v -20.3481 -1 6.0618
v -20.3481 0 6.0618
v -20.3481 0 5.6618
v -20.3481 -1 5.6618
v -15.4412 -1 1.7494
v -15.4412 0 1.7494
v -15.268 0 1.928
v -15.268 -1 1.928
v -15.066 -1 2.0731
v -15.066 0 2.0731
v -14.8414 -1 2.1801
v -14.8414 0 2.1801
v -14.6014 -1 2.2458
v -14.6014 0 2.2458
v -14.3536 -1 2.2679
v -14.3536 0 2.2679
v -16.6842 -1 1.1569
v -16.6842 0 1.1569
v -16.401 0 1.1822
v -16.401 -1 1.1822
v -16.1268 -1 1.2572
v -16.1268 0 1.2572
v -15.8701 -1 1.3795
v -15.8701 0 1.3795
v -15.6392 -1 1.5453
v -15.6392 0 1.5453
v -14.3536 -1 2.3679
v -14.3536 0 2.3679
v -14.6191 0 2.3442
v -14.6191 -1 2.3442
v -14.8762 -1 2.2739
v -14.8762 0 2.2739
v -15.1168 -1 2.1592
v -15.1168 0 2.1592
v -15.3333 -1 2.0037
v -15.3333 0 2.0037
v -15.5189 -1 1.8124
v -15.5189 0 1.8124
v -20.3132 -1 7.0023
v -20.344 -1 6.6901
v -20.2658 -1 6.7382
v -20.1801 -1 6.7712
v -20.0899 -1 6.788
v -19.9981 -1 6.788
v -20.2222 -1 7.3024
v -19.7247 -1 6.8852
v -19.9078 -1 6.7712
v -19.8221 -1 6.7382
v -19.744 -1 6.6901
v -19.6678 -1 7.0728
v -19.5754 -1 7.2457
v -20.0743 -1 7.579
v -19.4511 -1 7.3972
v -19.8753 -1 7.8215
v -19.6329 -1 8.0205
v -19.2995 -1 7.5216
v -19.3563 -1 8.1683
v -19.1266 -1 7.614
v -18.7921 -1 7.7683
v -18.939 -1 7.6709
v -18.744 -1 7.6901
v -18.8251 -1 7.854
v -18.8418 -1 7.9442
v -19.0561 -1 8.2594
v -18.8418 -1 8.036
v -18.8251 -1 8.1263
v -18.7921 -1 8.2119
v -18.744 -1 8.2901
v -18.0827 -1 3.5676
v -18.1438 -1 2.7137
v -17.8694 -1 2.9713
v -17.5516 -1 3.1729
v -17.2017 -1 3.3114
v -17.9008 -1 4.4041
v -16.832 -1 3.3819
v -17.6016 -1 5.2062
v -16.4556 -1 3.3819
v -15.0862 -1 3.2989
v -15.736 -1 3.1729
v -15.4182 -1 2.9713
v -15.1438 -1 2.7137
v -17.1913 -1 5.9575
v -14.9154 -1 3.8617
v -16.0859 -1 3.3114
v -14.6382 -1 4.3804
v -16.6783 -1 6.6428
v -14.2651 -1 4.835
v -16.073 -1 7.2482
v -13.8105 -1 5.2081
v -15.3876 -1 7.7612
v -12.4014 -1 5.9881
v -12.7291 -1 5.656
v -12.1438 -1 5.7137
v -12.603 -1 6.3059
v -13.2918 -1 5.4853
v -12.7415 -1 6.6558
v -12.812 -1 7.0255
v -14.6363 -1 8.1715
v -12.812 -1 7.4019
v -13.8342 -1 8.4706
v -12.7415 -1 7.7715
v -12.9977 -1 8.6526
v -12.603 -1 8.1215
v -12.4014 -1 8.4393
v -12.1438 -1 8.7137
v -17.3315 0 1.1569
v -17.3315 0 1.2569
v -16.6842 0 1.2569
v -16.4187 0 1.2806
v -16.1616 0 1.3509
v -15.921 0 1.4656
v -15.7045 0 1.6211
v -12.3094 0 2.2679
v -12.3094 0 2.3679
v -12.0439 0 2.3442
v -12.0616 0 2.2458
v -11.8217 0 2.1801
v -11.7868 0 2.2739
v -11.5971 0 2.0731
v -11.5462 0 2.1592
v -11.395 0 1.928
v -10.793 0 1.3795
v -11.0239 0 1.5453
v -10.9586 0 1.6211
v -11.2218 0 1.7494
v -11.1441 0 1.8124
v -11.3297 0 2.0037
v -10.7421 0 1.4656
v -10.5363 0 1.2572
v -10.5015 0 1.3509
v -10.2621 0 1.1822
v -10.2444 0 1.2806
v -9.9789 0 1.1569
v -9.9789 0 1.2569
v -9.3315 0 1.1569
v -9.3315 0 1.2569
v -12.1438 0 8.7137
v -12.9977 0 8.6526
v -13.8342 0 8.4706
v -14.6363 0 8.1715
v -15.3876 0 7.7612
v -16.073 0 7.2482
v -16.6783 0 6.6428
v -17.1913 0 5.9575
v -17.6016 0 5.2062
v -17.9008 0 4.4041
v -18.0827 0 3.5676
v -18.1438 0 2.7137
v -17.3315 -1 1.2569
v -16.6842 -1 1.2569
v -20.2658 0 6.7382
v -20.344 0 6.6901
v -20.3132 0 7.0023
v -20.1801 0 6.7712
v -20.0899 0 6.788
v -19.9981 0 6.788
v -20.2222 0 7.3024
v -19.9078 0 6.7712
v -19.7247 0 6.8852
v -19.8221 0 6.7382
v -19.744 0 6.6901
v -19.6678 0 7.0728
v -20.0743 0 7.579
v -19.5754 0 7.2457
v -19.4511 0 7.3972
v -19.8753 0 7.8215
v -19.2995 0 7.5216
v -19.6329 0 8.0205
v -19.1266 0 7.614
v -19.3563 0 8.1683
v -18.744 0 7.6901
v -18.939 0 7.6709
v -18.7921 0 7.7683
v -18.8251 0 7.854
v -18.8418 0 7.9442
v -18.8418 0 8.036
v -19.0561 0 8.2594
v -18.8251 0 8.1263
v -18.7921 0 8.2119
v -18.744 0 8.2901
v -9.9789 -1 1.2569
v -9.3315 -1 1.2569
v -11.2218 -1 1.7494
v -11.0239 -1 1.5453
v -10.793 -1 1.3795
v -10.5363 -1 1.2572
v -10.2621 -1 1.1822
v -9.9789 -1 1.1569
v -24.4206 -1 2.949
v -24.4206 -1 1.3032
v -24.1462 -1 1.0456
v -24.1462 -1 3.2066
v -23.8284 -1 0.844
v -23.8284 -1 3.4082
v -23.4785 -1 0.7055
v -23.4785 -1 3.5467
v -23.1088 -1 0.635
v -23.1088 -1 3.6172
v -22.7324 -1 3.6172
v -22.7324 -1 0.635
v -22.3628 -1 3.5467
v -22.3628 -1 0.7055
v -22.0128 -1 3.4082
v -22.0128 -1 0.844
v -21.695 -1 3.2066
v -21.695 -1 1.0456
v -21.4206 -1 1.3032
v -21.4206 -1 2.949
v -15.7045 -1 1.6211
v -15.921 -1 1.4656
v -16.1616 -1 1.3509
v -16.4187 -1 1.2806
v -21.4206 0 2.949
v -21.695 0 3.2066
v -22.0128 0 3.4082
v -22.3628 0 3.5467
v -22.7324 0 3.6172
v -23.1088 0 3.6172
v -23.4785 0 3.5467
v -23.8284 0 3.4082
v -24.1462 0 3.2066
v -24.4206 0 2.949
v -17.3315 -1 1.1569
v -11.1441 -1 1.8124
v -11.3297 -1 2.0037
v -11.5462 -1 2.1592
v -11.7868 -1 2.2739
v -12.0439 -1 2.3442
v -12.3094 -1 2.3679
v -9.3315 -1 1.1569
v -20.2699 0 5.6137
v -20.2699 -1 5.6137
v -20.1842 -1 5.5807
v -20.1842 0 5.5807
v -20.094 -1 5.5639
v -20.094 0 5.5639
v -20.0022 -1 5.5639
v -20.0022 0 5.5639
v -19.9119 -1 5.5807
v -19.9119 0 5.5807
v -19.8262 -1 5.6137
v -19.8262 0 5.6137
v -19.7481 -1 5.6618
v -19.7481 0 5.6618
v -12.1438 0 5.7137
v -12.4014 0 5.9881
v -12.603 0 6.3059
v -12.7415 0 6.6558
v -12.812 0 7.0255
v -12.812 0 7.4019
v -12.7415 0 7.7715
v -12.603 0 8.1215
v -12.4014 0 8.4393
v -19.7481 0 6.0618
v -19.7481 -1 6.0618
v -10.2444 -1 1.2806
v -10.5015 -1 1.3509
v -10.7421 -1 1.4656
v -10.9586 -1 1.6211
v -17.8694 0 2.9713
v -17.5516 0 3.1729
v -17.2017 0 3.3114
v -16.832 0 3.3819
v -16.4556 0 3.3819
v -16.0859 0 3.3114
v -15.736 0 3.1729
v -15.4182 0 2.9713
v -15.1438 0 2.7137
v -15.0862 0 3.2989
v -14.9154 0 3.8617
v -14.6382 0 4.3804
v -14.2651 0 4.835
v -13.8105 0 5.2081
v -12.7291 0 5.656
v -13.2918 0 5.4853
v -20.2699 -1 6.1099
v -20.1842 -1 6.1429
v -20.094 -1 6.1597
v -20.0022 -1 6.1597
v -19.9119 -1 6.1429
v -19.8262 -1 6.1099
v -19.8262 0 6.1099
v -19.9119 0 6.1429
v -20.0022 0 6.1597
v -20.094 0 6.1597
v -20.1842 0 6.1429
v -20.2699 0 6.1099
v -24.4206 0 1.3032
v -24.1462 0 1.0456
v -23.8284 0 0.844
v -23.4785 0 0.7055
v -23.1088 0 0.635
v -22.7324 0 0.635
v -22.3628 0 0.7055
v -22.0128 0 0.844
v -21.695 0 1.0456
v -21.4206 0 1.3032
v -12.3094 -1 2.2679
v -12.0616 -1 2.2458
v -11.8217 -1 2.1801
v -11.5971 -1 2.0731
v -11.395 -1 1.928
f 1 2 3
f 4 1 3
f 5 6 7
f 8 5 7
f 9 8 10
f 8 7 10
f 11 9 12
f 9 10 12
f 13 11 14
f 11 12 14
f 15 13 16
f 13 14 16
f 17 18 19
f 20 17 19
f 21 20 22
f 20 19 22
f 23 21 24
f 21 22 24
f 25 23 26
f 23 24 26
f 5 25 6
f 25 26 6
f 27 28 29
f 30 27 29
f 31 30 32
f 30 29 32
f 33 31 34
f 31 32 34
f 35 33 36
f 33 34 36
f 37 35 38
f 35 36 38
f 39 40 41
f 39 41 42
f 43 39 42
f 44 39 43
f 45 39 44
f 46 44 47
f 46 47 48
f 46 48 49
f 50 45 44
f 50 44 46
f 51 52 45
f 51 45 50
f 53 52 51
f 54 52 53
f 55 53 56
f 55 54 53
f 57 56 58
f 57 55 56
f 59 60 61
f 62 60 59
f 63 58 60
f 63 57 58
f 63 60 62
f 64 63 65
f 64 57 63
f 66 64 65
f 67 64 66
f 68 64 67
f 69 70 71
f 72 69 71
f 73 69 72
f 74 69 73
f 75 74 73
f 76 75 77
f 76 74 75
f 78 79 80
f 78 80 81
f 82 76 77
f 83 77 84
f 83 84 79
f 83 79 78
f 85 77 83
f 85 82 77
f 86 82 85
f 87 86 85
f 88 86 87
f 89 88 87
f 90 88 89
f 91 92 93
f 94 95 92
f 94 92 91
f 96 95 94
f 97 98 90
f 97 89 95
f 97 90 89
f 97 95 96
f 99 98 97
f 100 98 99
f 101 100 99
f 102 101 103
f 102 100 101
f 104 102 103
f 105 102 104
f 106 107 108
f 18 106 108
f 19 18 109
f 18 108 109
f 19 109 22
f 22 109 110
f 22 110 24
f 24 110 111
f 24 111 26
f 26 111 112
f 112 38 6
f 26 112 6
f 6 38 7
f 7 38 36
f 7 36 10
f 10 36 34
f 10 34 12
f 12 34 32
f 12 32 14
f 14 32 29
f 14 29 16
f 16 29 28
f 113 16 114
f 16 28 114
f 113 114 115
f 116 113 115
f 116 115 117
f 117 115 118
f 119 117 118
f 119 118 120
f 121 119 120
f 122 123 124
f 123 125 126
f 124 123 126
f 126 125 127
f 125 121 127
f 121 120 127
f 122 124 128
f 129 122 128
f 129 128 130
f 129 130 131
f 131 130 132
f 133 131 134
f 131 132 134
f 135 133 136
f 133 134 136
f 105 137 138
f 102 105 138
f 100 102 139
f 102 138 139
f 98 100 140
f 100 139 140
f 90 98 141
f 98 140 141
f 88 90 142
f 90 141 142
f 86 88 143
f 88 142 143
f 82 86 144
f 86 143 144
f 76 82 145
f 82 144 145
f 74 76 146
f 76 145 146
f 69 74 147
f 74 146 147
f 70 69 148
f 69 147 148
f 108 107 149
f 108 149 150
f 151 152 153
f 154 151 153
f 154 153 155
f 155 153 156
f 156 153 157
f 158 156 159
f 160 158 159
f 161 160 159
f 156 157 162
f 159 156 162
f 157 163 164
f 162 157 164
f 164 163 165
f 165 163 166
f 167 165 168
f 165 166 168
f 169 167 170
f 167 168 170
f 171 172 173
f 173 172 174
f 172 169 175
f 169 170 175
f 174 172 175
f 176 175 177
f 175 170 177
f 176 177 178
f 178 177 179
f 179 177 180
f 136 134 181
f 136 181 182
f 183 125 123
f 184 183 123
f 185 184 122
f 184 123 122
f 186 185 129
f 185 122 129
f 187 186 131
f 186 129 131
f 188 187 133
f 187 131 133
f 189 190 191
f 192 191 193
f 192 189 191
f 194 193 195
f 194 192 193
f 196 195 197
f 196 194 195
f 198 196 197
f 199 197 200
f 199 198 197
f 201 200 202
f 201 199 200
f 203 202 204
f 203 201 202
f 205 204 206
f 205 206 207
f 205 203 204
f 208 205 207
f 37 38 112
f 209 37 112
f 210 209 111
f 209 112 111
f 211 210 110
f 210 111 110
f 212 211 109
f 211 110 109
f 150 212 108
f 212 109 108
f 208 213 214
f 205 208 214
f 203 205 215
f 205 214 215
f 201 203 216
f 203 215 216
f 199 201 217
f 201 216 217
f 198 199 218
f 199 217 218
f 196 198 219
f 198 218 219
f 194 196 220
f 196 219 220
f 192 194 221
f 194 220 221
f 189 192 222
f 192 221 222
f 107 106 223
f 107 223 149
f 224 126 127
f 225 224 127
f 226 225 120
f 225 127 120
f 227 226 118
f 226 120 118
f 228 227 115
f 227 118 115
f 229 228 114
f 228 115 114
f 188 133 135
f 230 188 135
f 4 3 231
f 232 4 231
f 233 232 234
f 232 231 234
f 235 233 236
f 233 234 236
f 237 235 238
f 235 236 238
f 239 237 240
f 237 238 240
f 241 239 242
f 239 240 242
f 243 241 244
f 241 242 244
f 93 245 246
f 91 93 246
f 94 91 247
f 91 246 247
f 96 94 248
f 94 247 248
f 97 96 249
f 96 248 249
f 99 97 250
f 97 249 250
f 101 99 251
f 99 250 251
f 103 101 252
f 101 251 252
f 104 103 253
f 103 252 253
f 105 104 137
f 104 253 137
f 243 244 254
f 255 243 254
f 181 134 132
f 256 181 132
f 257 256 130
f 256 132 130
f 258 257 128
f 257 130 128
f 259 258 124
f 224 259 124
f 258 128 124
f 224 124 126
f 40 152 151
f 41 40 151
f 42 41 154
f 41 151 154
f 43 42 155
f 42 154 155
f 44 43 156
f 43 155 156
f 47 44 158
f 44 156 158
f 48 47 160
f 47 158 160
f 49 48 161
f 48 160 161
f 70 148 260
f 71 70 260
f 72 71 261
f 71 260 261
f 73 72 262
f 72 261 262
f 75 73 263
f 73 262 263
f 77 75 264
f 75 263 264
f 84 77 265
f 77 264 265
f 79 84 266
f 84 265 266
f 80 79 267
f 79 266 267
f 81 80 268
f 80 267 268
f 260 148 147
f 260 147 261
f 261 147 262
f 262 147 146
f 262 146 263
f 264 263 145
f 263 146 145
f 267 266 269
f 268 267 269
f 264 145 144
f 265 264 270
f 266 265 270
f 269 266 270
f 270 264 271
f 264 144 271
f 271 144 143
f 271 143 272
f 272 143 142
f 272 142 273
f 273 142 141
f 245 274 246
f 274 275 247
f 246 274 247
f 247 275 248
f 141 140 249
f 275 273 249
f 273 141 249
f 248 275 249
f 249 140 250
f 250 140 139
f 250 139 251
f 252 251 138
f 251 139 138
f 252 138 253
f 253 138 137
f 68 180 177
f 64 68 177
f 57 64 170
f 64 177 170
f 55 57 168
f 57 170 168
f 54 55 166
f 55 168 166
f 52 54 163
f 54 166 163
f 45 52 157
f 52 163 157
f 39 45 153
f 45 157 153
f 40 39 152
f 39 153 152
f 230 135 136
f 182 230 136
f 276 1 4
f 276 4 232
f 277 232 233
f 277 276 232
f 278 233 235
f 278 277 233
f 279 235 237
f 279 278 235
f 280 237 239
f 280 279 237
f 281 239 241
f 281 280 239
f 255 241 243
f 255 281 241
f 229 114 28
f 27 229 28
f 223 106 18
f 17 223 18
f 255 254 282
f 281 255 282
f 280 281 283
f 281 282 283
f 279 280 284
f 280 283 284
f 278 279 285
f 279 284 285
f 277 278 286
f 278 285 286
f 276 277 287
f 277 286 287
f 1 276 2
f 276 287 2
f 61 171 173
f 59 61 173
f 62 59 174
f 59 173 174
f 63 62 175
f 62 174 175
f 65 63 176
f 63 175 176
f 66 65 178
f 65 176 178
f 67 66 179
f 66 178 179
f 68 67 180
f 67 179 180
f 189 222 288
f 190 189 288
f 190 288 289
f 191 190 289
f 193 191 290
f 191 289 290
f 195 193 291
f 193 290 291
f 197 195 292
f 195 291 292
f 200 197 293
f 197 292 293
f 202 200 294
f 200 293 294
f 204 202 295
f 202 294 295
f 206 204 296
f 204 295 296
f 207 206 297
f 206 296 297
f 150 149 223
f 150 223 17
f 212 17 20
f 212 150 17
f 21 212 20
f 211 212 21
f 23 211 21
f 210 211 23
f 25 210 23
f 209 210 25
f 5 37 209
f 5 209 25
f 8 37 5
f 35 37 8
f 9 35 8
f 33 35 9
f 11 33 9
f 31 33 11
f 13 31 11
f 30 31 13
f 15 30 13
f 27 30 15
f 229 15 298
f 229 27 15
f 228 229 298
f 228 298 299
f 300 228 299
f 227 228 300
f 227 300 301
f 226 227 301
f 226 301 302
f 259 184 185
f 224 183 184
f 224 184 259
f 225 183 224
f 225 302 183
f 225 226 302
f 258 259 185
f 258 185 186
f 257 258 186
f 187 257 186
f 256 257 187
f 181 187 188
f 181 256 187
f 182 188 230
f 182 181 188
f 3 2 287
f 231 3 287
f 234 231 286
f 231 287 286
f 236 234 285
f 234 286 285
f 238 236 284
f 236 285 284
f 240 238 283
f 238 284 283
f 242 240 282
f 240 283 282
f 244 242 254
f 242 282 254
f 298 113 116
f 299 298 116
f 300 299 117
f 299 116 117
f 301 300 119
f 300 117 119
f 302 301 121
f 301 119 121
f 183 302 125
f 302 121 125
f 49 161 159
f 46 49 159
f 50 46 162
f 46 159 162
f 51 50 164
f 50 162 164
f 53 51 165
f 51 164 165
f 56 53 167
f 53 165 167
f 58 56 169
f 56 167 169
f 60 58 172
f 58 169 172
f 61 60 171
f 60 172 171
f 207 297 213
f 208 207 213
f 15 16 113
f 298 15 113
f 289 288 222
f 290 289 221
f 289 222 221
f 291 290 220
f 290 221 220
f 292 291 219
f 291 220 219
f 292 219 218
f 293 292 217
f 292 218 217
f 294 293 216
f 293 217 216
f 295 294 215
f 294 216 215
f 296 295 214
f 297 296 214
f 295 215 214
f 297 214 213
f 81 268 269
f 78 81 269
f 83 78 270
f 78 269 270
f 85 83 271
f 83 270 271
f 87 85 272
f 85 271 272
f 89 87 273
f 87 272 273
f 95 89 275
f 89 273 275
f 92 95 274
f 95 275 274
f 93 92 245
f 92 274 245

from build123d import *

# Parameters (mm, degrees)
F0_W     = 3
F0_H     = 0.8228756555
F1_DEPTH = 1
F0_W_2   = 0.6
F0_H_2   = 0.2
F2_W     = 0.6473389859
F2_H     = 0.1
F2_W_2   = 1.0221048092
F3_DEPTH = 1


with BuildPart() as f1:
    # F0 (on Front) → F1 (new body)
    with BuildSketch(Plane.XZ):
        with Locations((-22.920627147, 2.5375319613)):
            Rectangle(F0_W, F0_H)
        with Locations((-22.920627147, 1.7146563058)):
            Rectangle(F0_W, F0_H)
        with BuildLine():
            Line((-21.420627147, 1.303218478), (-24.420627147, 1.303218478))
            ThreePointArc((-24.420627147, 1.303218478), (-22.920627147, 0.6260941336), (-21.420627147, 1.303218478))
        make_face()
        with BuildLine():
            ThreePointArc((-21.420627147, 2.9489697891), (-22.920627147, 3.6260941336), (-24.420627147, 2.9489697891))
            Line((-24.420627147, 2.9489697891), (-21.420627147, 2.9489697891))
        make_face()
    extrude(amount=F1_DEPTH)


with BuildPart() as f1b:
    # F0 (on Front) → F1, piece 2 (new body)
    with BuildSketch(Plane.XZ):
        with Locations((-20.0480559736, 5.9617664746)):
            Rectangle(F0_W_2, F0_H_2)
        with Locations((-20.0480559736, 5.7617664746)):
            Rectangle(F0_W_2, F0_H_2)
        with BuildLine():
            Line((-19.7480559736, 5.6617664746), (-20.3480559736, 5.6617664746))
            ThreePointArc((-20.3480559736, 5.6617664746), (-20.0480559736, 5.5617664746), (-19.7480559736, 5.6617664746))
        make_face()
        with BuildLine():
            ThreePointArc((-19.7480559736, 6.0617664746), (-20.0480559736, 6.1617664746), (-20.3480559736, 6.0617664746))
            Line((-20.3480559736, 6.0617664746), (-19.7480559736, 6.0617664746))
        make_face()
    extrude(amount=F1_DEPTH)


with BuildPart() as f1c:
    # F0 (on Front) → F1, piece 3 (new body)
    with BuildSketch(Plane.XZ):
        with BuildLine():
            ThreePointArc((-12.1437952999, 5.7136720182), (-12.8209196444, 7.2136720182), (-12.1437952999, 8.7136720182))
            ThreePointArc((-12.1437952999, 8.7136720182), (-16.3864359871, 6.9563127053), (-18.1437952999, 2.7136720182))
            ThreePointArc((-18.1437952999, 2.7136720182), (-16.6437952999, 3.3907963627), (-15.1437952999, 2.7136720182))
            ThreePointArc((-15.1437952999, 2.7136720182), (-14.2651156435, 4.8349923618), (-12.1437952999, 5.7136720182))
        make_face()
    extrude(amount=F1_DEPTH)


with BuildPart() as f1d:
    # F0 (on Front) → F1, piece 4 (new body)
    with BuildSketch(Plane.XZ):
        with BuildLine():
            ThreePointArc((-18.7439574825, 7.6901305423), (-18.8439574825, 7.9901305423), (-18.7439574825, 8.2901305423))
            ThreePointArc((-18.7439574825, 8.2901305423), (-19.8753283324, 7.8215013922), (-20.3439574825, 6.6901305423))
            ThreePointArc((-20.3439574825, 6.6901305423), (-20.0439574825, 6.7901305423), (-19.7439574825, 6.6901305423))
            ThreePointArc((-19.7439574825, 6.6901305423), (-19.4510642637, 7.3972373235), (-18.7439574825, 7.6901305423))
        make_face()
    extrude(amount=F1_DEPTH)


with BuildPart() as f3:
    # F2 (on Front) → F3 (new body)
    with BuildSketch(Plane.XZ):
        with Locations((-17.0078618377, 1.2069130704)):
            Rectangle(F2_W, F2_H)
        with BuildLine():
            ThreePointArc((-15.5189142423, 1.8123883518), (-16.0387417571, 1.4028844374), (-16.6841923447, 1.2569130704))
            Line((-16.6841923447, 1.2569130704), (-16.6841923447, 1.1569130704))
            ThreePointArc((-16.6841923447, 1.1569130704), (-15.9957117179, 1.3126158619), (-15.4412290355, 1.7494200372))
            ThreePointArc((-15.4412290355, 1.7494200372), (-14.9560566883, 2.1316236907), (-14.3536361399, 2.2678636332))
            Line((-14.3536361399, 2.2678636332), (-14.3536361399, 2.3678636332))
            ThreePointArc((-14.3536361399, 2.3678636332), (-14.9990867275, 2.2218922662), (-15.5189142423, 1.8123883518))
        make_face()
        with Locations((-13.8425837353, 2.3178636332)):
            Rectangle(F2_W_2, F2_H)
        with Locations((-12.8204789261, 2.3178636332)):
            Rectangle(F2_W_2, F2_H)
        with BuildLine():
            ThreePointArc((-11.144148419, 1.8123883518), (-11.6639759338, 2.2218922662), (-12.3094265214, 2.3678636332))
            Line((-12.3094265214, 2.3678636332), (-12.3094265214, 2.2678636332))
            ThreePointArc((-12.3094265214, 2.2678636332), (-11.707005973, 2.1316236907), (-11.2218336259, 1.7494200372))
            ThreePointArc((-11.2218336259, 1.7494200372), (-10.6673509434, 1.3126158619), (-9.9788703166, 1.1569130704))
            Line((-9.9788703166, 1.1569130704), (-9.9788703166, 1.2569130704))
            ThreePointArc((-9.9788703166, 1.2569130704), (-10.6243209042, 1.4028844374), (-11.144148419, 1.8123883518))
        make_face()
        with Locations((-9.6552008236, 1.2069130704)):
            Rectangle(F2_W, F2_H)
    extrude(amount=F3_DEPTH)


solid = Compound([f1.part, f1b.part, f1c.part, f1d.part, f3.part])
